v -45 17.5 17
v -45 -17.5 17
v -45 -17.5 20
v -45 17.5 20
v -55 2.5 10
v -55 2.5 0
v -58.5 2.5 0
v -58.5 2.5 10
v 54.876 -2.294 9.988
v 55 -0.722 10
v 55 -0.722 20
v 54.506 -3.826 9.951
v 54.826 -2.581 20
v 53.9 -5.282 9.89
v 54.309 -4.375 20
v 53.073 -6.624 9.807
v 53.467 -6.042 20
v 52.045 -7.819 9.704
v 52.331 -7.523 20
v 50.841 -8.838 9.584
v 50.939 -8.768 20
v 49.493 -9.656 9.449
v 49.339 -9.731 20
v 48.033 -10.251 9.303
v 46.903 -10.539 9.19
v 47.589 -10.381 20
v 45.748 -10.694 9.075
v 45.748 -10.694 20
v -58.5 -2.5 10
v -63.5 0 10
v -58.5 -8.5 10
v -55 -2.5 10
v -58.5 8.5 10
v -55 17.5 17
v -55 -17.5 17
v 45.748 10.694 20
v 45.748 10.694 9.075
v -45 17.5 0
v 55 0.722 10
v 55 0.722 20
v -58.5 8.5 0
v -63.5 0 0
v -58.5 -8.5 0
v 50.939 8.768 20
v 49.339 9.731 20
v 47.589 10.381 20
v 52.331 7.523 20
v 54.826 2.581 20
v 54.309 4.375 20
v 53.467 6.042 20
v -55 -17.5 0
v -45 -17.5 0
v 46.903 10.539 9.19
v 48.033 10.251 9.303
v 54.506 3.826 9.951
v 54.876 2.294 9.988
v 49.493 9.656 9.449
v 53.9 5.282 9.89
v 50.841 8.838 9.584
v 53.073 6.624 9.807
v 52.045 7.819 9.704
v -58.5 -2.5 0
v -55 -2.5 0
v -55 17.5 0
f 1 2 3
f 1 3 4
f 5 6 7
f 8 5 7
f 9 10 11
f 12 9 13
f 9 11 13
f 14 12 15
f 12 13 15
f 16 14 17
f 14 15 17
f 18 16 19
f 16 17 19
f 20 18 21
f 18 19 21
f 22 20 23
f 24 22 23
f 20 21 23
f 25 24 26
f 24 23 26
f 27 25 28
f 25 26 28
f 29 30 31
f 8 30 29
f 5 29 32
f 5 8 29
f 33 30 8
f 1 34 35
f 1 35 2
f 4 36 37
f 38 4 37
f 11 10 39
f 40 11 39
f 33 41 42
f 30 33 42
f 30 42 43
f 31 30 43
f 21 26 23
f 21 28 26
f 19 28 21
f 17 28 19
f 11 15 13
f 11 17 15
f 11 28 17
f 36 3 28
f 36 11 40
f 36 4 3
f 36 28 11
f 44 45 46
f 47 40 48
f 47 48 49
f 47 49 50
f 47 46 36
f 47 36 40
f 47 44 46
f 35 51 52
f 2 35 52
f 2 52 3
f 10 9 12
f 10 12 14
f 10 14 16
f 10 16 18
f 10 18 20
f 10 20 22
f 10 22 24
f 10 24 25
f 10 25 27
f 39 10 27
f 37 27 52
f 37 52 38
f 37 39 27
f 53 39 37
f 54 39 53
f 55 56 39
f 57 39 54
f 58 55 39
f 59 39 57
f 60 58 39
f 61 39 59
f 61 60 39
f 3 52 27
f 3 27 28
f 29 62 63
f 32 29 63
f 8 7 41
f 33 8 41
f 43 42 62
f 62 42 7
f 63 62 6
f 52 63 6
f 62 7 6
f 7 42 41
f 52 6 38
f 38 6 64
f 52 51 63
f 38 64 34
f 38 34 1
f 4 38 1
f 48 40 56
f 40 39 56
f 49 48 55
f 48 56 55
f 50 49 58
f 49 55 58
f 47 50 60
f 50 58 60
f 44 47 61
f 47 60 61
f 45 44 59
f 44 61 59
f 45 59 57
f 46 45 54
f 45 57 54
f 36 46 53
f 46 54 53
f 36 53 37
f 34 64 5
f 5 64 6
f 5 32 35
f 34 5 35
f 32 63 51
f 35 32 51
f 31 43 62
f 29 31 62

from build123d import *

# Parameters (mm, degrees)
F1_DEPTH = 10
F2_DEPTH = 17
F3_W     = 100
F3_H     = 35
F4_DEPTH = 3
F5_SIZE2 = 10
F5_SIZE  = 100
F6_SIZE2 = 99.99999
F6_SIZE  = 7.49999
F7_R     = 10


# Not quite as in the source:
# - a fillet or chamfer is up to 0.001 mm smaller than in the source, because OpenCascade refuses the exact size


with BuildPart() as f1:
    # F0 (on Top) → F1 (new body)
    with BuildSketch(Plane.XY):
        Polygon((-58.5, -8.5), (-58.5, -2.5), (-58.5, 0), (-58.5, 2.5), (-58.5, 8.5), (-63.5, 0), align=None)
        Polygon((-58.5, -2.5), (-55, -2.5), (-55, 2.5), (-58.5, 2.5), (-58.5, 0), align=None)
    extrude(amount=F1_DEPTH)

    # F0 (on Top) → F2 (join)
    with BuildSketch(Plane.XY):
        Polygon((-55, -17.5), (55, -17.5), (55, 17.5), (-55, 17.5), (-55, 2.5), (-55, -2.5), align=None)
    extrude(amount=F2_DEPTH)

    # F3 (on face) → F4 (join)
    with BuildSketch(Plane.XY.offset(17)):
        with Locations((5, 0)):
            Rectangle(F3_W, F3_H)
    extrude(amount=F4_DEPTH)

    # F5
    f5_edges = [f1.edges().sort_by_distance(p)[0] for p in [
        (55, 0, 0),
    ]]
    f5_side = f1.faces().sort_by_distance((-0.907982, 0, 0))[0]
    chamfer(f5_edges, length=F5_SIZE, length2=F5_SIZE2, reference=f5_side)

    # F6 (size 7.5 and 100 in the source; OpenCascade refuses exactly that, so slightly less here)
    f6_edges = [f1.edges().sort_by_distance(p)[0] for p in [
        (55, -17.5, 15),
        (55, 17.5, 15),
    ]]
    f6_side = f1.faces().sort_by_distance((55, 0, 15))[0]
    chamfer(f6_edges, length=F6_SIZE, length2=F6_SIZE2, reference=f6_side)

    # F7
    f7_edges = [f1.edges().sort_by_distance(p)[0] for p in [
        (55, -10.00001, 15),
        (55, 10.00001, 15),
    ]]
    fillet(f7_edges, radius=F7_R)


solid = f1.part
